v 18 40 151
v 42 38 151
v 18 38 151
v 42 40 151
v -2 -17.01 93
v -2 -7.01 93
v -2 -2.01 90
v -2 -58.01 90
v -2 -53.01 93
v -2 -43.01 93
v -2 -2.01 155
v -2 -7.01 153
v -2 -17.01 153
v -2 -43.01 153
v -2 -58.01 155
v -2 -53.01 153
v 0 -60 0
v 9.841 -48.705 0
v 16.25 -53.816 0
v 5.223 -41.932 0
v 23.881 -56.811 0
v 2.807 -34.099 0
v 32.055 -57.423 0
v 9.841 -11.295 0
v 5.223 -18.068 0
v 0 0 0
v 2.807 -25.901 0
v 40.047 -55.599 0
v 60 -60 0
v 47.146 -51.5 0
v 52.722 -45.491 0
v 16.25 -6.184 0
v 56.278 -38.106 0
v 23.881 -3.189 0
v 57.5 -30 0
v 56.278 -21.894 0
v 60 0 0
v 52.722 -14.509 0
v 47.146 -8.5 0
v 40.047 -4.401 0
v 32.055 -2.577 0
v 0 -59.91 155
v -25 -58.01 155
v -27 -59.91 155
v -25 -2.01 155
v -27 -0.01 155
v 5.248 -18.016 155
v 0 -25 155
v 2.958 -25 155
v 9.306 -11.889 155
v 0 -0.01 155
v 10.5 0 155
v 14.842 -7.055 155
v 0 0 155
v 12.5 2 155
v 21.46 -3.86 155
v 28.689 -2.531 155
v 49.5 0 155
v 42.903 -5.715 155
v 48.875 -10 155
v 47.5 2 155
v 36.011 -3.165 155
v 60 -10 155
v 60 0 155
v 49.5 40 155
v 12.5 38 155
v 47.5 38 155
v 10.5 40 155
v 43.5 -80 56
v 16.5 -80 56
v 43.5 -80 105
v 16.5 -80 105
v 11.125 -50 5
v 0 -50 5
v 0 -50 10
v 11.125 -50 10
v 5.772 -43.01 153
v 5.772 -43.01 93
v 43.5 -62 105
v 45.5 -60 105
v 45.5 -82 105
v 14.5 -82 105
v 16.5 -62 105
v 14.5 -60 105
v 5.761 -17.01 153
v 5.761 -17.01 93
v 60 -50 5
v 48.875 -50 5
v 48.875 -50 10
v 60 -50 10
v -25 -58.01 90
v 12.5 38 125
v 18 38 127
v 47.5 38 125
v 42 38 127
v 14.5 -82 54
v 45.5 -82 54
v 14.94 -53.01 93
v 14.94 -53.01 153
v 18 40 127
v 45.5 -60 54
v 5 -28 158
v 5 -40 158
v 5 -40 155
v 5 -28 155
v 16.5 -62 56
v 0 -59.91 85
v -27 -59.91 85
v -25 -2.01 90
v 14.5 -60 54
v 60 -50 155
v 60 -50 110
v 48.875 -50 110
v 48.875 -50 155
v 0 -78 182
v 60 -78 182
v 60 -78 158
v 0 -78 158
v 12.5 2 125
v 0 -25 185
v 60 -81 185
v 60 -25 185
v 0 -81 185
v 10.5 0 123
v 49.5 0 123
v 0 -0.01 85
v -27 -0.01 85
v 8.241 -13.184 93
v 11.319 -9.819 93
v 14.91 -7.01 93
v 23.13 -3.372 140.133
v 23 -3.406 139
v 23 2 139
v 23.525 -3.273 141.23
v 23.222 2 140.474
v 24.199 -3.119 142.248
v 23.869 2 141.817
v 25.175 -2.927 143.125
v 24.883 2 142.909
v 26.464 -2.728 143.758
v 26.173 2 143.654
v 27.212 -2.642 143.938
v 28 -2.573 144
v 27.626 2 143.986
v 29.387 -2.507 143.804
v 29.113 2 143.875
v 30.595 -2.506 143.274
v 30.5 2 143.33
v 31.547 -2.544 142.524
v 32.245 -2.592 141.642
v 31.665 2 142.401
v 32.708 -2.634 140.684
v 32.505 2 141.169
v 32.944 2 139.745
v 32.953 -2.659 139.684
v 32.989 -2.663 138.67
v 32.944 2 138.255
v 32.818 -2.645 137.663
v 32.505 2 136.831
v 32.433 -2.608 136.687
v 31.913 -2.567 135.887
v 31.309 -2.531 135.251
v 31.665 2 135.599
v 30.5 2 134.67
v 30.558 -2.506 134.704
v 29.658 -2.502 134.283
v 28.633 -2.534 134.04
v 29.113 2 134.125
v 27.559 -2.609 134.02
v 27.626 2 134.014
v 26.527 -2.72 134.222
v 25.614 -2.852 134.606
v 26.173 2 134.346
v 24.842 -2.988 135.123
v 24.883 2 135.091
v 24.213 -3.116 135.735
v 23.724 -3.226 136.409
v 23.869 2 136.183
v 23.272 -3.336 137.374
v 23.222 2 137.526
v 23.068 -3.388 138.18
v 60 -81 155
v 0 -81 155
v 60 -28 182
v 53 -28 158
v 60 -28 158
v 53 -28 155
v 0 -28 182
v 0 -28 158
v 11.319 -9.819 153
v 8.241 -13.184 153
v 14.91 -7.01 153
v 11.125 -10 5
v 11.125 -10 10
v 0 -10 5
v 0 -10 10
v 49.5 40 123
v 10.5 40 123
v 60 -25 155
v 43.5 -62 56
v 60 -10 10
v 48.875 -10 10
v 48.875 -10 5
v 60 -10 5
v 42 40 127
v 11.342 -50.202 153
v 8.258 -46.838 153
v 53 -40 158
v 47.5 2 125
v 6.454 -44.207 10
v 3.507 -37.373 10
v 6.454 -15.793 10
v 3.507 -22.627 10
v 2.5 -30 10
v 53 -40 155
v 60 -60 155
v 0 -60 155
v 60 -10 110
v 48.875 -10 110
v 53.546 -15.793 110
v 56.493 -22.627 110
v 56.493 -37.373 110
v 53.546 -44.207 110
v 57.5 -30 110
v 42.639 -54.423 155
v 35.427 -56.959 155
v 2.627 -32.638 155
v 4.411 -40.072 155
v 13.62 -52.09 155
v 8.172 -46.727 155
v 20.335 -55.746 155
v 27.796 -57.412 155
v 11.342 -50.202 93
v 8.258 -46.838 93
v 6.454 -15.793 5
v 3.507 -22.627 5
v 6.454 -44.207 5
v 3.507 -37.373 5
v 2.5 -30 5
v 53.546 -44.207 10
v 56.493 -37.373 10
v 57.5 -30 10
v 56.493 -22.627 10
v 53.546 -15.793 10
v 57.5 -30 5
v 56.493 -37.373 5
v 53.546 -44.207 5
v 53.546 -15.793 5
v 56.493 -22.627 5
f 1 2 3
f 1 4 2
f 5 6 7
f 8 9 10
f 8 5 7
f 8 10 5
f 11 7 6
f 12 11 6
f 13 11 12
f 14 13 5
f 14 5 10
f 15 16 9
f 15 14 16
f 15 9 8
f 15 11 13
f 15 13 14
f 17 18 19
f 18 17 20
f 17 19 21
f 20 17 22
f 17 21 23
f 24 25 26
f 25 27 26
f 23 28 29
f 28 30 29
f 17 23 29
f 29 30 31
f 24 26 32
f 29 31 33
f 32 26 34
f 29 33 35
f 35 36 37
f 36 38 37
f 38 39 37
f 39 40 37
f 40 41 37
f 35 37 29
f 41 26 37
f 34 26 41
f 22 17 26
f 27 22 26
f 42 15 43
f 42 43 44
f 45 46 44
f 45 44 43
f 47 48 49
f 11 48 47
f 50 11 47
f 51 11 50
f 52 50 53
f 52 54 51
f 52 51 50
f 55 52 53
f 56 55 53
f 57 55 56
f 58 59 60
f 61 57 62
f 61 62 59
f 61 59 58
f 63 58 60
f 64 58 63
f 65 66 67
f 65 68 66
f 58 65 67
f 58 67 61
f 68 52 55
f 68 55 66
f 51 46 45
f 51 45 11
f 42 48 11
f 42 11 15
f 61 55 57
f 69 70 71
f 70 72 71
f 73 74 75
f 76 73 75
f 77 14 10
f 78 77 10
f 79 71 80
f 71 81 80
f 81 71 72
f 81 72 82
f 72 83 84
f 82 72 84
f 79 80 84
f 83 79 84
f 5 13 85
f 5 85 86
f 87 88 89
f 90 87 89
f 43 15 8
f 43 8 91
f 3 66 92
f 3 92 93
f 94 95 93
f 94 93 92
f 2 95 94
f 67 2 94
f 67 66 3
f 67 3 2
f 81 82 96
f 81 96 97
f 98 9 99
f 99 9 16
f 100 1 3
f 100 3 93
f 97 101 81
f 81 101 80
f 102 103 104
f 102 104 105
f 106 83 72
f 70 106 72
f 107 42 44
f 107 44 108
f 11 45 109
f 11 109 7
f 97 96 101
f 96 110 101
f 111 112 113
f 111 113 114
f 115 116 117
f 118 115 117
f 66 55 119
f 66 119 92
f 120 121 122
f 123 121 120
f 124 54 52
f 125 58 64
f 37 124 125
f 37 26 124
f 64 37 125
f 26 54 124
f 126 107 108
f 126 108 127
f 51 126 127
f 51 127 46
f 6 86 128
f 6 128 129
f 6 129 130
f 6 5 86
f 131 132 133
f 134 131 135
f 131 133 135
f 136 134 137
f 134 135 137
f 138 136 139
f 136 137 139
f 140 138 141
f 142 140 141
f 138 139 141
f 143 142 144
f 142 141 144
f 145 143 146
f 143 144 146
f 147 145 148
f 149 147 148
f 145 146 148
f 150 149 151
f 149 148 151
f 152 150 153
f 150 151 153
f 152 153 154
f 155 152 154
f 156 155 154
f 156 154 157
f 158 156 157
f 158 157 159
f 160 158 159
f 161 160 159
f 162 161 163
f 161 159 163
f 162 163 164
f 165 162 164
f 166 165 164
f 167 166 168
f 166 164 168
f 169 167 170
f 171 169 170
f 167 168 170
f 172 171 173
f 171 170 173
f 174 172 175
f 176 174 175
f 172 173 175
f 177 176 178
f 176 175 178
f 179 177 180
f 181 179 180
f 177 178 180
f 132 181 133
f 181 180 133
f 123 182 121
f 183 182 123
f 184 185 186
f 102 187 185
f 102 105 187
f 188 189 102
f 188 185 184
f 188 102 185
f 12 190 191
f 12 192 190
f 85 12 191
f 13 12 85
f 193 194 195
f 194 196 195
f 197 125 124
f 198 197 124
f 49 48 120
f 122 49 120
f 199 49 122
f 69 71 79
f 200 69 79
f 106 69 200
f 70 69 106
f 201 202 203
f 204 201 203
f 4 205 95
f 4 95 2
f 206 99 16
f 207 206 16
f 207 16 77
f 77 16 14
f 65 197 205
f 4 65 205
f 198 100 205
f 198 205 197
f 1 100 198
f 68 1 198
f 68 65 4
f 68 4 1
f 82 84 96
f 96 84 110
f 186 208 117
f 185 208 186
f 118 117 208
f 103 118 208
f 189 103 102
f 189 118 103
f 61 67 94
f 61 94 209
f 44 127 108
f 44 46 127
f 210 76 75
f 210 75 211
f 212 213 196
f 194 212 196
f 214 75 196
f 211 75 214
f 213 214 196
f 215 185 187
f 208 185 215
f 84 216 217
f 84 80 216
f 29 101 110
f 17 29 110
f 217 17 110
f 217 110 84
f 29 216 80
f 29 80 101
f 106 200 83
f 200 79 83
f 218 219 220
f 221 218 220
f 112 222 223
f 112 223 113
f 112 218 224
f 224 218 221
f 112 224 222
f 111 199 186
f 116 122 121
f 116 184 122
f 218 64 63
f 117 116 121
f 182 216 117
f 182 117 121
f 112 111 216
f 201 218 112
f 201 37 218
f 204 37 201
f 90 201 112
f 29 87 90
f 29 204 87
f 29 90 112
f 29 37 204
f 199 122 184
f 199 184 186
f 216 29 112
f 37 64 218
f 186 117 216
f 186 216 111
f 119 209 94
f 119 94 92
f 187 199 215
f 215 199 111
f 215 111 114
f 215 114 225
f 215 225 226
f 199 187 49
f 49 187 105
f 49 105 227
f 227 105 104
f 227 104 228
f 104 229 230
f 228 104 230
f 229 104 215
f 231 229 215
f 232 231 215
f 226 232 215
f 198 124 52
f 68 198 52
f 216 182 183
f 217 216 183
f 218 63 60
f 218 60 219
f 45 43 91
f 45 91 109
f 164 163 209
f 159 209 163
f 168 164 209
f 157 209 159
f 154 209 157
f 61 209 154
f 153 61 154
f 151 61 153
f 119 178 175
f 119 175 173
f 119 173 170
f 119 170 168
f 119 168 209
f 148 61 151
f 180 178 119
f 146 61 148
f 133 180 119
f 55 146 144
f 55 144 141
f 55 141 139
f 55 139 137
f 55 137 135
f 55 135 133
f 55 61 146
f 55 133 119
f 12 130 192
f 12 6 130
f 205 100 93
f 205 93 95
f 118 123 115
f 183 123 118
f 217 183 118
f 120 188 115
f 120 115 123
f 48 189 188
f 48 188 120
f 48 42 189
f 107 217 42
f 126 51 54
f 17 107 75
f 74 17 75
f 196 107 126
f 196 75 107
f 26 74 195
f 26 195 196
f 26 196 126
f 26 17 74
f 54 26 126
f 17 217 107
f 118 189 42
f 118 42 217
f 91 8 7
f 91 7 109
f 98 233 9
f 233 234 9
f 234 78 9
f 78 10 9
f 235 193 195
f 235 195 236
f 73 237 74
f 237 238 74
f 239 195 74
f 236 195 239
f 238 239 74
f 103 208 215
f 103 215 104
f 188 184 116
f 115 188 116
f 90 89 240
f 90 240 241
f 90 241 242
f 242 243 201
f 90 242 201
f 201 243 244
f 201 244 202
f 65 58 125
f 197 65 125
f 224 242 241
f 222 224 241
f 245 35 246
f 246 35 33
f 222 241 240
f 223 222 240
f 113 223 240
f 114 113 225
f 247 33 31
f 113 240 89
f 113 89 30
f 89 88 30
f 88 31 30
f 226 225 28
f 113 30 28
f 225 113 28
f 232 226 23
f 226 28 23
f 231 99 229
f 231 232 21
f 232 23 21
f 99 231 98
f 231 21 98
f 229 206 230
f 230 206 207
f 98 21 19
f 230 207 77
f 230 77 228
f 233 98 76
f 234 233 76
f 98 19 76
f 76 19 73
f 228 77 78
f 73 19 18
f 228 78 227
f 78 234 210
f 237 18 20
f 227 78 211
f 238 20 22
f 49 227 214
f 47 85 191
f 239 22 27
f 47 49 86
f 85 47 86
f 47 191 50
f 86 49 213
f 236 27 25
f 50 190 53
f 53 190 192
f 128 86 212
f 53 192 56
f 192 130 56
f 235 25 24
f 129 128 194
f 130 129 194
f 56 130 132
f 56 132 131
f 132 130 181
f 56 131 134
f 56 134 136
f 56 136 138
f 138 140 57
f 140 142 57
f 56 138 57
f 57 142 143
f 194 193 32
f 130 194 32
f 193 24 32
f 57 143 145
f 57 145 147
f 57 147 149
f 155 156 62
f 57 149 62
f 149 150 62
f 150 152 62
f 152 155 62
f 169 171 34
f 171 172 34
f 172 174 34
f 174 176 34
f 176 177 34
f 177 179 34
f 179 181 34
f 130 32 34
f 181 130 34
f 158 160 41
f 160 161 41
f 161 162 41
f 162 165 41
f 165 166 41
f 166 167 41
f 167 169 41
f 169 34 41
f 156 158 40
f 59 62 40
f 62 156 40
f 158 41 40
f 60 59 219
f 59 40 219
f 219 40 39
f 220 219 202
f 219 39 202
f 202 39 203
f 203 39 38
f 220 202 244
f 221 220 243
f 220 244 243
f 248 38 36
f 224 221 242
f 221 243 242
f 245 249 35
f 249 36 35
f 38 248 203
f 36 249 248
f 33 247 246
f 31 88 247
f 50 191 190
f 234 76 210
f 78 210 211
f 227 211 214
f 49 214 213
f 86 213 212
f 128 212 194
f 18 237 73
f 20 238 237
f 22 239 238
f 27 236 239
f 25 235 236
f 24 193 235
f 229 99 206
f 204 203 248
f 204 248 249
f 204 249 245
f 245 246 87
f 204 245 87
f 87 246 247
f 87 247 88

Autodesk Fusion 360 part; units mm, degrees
sketch "Sketch1" plane through (0, 0, 0) normal (0, 0, 1) x (1, 0, 0)
  line L0 (0, 0) -> (60, 0)
  line L1 (60, 0) -> (60, -60)
  line L2 (60, -60) -> (0, -60)
  line L3 (0, -60) -> (0, 0)
  dimension "d1" = 60
  dimension "d2" = 60
extrude "Extrude1" add sketch "Sketch1" along normal blind 155
sketch "Sketch2" plane through (0, 0, 0) normal (0, 0, 1) x (1, 0, 0)
  line L0 (0, 0) -> (30, 0)
  line L1 (30, 0) -> (30, -30)
  circle A0 centre (30, -30) radius 27.5
  dimension "d5" = 30
  dimension "d6" = 30
  dimension "d7" = 55
extrude "Extrude2" cut sketch "Sketch2" along normal through all
sketch "Sketch3" plane through (0, 0, 0) normal (1, 0, 0) x (0, 1, 0)
  line L0 (0, 0) -> (0, 5)
  line L1 (0, 5) -> (-10, 5)
  line L2 (-10, 5) -> (-50, 5)
  line L3 (-50, 5) -> (-50, 10)
  line L4 (-50, 10) -> (-10, 10)
  line L5 (-10, 10) -> (-10, 5)
  dimension "d9" = 10
  dimension "d10" = 5
  dimension "d11" = 40
  dimension "d12" = 5
extrude "Extrude3" cut sketch "Sketch3" along normal through all
sketch "Sketch4" plane through (0, 0, 0) normal (-1, 0, 0) x (0, -1, 0)
  line L0 (50, 10) -> (50, 5)
  line L1 (50, 5) -> (10, 5)
  line L2 (10, 5) -> (10, 10)
  line L3 (10, 10) -> (50, 10)
  line L4 (0, 0) -> (60, 0)
  line L5 (60, 0) -> (60, 155)
  line L6 (60, 155) -> (0, 155)
  line L7 (0, 155) -> (0, 0)
  line L8 (0, 155) -> (0.01, 155)
  line L9 (0.01, 155) -> (59.91, 155)
  line L10 (59.91, 155) -> (59.91, 85)
  line L11 (59.91, 85) -> (0.01, 85)
  line L12 (0.01, 85) -> (0.01, 155)
  dimension "d14" = 0.01
  dimension "d15" = 59.9
  dimension "d16" = 70
extrude "Extrude4" add sketch "Sketch4" along normal blind 27 contours L6 L9 L10 L11 L12
sketch "Sketch5" plane through (0, 0, 155) normal (0, 0, 1) x (-1, 0, 0)
  circle A0 centre (-30, 30) radius 27.5
  line L0 (0, 60) -> (-60, 60)
  line L1 (-60, 60) -> (-60, 0)
  line L2 (-60, 0) -> (0, 0)
  line L3 (0, 0) -> (0, 0.01)
  line L4 (0, 0.01) -> (27, 0.01)
  line L5 (27, 0.01) -> (27, 59.91)
  line L6 (27, 59.91) -> (0, 59.91)
  line L7 (0, 59.91) -> (0, 60)
  line L8 (27, 0.01) -> (25, 0.01)
  line L9 (25, 0.01) -> (25, 2.01)
  line L10 (25, 2.01) -> (2, 2.01)
  line L11 (2, 2.01) -> (2, 58.01)
  line L12 (2, 58.01) -> (25, 58.01)
  line L13 (25, 58.01) -> (25, 2.01)
  dimension "d19" = 2
  dimension "d20" = 2
  dimension "d21" = 23
  dimension "d22" = 56
extrude "Extrude5" cut sketch "Sketch5" against normal blind 65 contours L10 L11 L12 L13
sketch "Sketch6" plane through (0, -60, 0) normal (0, -1, 0) x (1, 0, 0)
  line L0 (0, 0) -> (60, 0)
  line L1 (60, 0) -> (60, 155)
  line L2 (60, 155) -> (0, 155)
  line L3 (0, 155) -> (0, 0)
sketch "Sketch7" plane through (60, 0, 0) normal (1, 0, 0) x (0, 1, 0)
  line L0 (-50, 5) -> (-50, 10)
  line L1 (-50, 10) -> (-10, 10)
  line L2 (-10, 10) -> (-10, 5)
  line L3 (-10, 5) -> (-50, 5)
  line L4 (-60, 0) -> (0, 0)
  line L5 (0, 0) -> (0, 155)
  line L6 (0, 155) -> (-60, 155)
  line L7 (-60, 155) -> (-60, 0)
sketch "Sketch8" plane through (0, -60, 0) normal (0, -1, 0) x (1, 0, 0)
sketch "Sketch9" plane through (0, -60, 0) normal (0, -1, 0) x (1, 0, 0)
sketch "Sketch10" plane through (0, 0, 0) normal (0, 1, 0) x (-1, 0, 0)
  line L0 (-60, 0) -> (0, 0)
  line L1 (0, 0) -> (0, 155)
  line L2 (0, 155) -> (-60, 155)
  line L3 (-60, 155) -> (-60, 0)
  line L4 (0, 155) -> (-10.5, 155)
  line L5 (-10.5, 155) -> (-49.5, 155)
  line L6 (-49.5, 155) -> (-49.5, 123)
  line L7 (-49.5, 123) -> (-10.5, 123)
  line L8 (-10.5, 123) -> (-10.5, 155)
  dimension "d25" = 10.5
  dimension "d26" = 39
  dimension "d27" = 32
extrude "Extrude6" add sketch "Sketch10" along normal blind 40 contours L2 L5 L6 L7 L8
sketch "Sketch11" plane through (0, 0, 155) normal (0, 0, 1) x (-1, 0, 0)
  line L0 (2, 2.01) -> (2, 58.01)
  line L1 (2, 58.01) -> (25, 58.01)
  line L2 (25, 58.01) -> (25, 2.01)
  line L3 (25, 2.01) -> (2, 2.01)
  circle A0 centre (-30, 30) radius 27.5
  line L4 (0, 60) -> (-60, 60)
  line L5 (-60, 60) -> (-60, 0)
  line L6 (-60, 0) -> (-49.5, 0)
  line L7 (-49.5, 0) -> (-49.5, -40)
  line L8 (-49.5, -40) -> (-10.5, -40)
  line L9 (-10.5, -40) -> (-10.5, 0)
  line L10 (-10.5, 0) -> (0, 0)
  line L11 (0, 0) -> (0, 0.01)
  line L12 (0, 0.01) -> (27, 0.01)
  line L13 (27, 0.01) -> (27, 59.91)
  line L14 (27, 59.91) -> (0, 59.91)
  line L15 (0, 59.91) -> (0, 60)
sketch "Sketch12" plane through (0, 0, 155) normal (0, 0, 1) x (-1, 0, 0)
sketch "Sketch13" plane through (0, 0, 155) normal (0, 0, 1) x (-1, 0, 0)
sketch "Sketch15" plane through (0, 0, 155) normal (0, 0, 1) x (-1, 0, 0)
  line L0 (-49.5, 0) -> (-47.5, 0)
  line L1 (-47.5, 0) -> (-47.5, -2)
  line L2 (-60, 0) -> (-49.5, 0)
  line L3 (-49.5, 0) -> (-49.5, -40)
  line L4 (-47.5, -2) -> (-12.5, -2)
  line L5 (-12.5, -2) -> (-12.5, -38)
  line L6 (-12.5, -38) -> (-47.5, -38)
  line L7 (-47.5, -38) -> (-47.5, -2)
  dimension "d34" = 2
  dimension "d35" = 2
  dimension "d36" = 35
  dimension "d37" = 36
extrude "Extrude7" cut sketch "Sketch15" against normal blind 30
sketch "Sketch16" plane through (0, 40, 0) normal (0, 1, 0) x (-1, 0, 0)
  line L0 (-10.5, 123) -> (-10.5, 155)
  line L1 (-10.5, 155) -> (-49.5, 155)
  line L2 (-49.5, 155) -> (-49.5, 123)
  line L3 (-49.5, 123) -> (-10.5, 123)
  line L4 (-49.5, 155) -> (-42, 155)
  line L5 (-42, 155) -> (-42, 151)
  line L6 (-42, 151) -> (-18, 151)
  line L7 (-18, 151) -> (-18, 127)
  line L8 (-18, 127) -> (-42, 127)
  line L9 (-42, 127) -> (-42, 151)
  dimension "d40" = 7.5
  dimension "d41" = 4
  dimension "d42" = 24
  dimension "d43" = 24
extrude "Extrude8" cut sketch "Sketch16" against normal blind 15 contours L6 L7 L8 L9
sketch "Sketch17" plane through (0, 2, 0) normal (0, 1, 0) x (-1, 0, 0)
  line L0 (-12.5, 155) -> (-47.5, 155)
  line L1 (-47.5, 155) -> (-47.5, 125)
  line L2 (-47.5, 125) -> (-12.5, 125)
  line L3 (-12.5, 125) -> (-12.5, 155)
  line L4 (-47.5, 155) -> (-28, 155)
  line L5 (-28, 155) -> (-28, 139)
  circle A0 centre (-28, 139) radius 5
  dimension "d46" = 19.5
  dimension "d47" = 16
  dimension "d48" = 10
extrude "Extrude9" cut sketch "Sketch17" against normal blind 12 contours A0
sketch "Sketch18" plane through (0, -60, 0) normal (0, -1, 0) x (1, 0, 0)
sketch "Sketch19" plane through (0, -60, 0) normal (0, -1, 0) x (1, 0, 0)
sketch "Sketch20" plane through (0, -60, 0) normal (0, -1, 0) x (1, 0, 0)
  line L0 (45.5, 105) -> (14.5, 105)
  line L1 (14.5, 105) -> (14.5, 54)
  line L2 (14.5, 54) -> (45.5, 54)
  line L3 (45.5, 54) -> (45.5, 105)
  line L4 (60, 0) -> (60, 155)
  line L5 (45.5, 105) -> (60, 105)
  line L6 (60, 105) -> (60, 155)
  dimension "d52" = 31
  dimension "d53" = 51
  dimension "d96" = 50
  dimension "d97" = 14.5
extrude "Extrude10" add sketch "Sketch20" along normal blind 22
sketch "Sketch21" plane through (0, 0, 155) normal (0, 0, 1) x (-1, 0, 0)
  line L0 (-12.5, -2) -> (-12.5, -38)
  line L1 (-12.5, -38) -> (-47.5, -38)
  line L2 (-47.5, -38) -> (-47.5, -2)
  line L3 (-47.5, -2) -> (-12.5, -2)
  line L4 (2, 2.01) -> (2, 58.01)
  line L5 (2, 58.01) -> (25, 58.01)
  line L6 (25, 58.01) -> (25, 2.01)
  line L7 (25, 2.01) -> (2, 2.01)
  circle A0 centre (-30, 30) radius 27.5
  line L8 (0, 60) -> (-60, 60)
  line L9 (-60, 60) -> (-60, 0)
  line L10 (-60, 0) -> (-49.5, 0)
  line L11 (-49.5, 0) -> (-49.5, -40)
  line L12 (-49.5, -40) -> (-10.5, -40)
  line L13 (-10.5, -40) -> (-10.5, 0)
  line L14 (-10.5, 0) -> (0, 0)
  line L15 (0, 0) -> (0, 0.01)
  line L16 (0, 0.01) -> (27, 0.01)
  line L17 (27, 0.01) -> (27, 59.91)
  line L18 (27, 59.91) -> (0, 59.91)
  line L19 (0, 59.91) -> (0, 60)
  line L20 (-14.5, 82) -> (-14.5, 80)
  line L21 (-14.5, 80) -> (-16.5, 80)
  dimension "d56" = 2
  dimension "d57" = 2
sketch "Sketch22" plane through (0, 0, 155) normal (0, 0, 1) x (-1, 0, 0)
  line L0 (-16.5, 80) -> (-43.5, 80)
  line L1 (-43.5, 80) -> (-43.5, 62)
  line L2 (-43.5, 62) -> (-16.5, 62)
  line L3 (-16.5, 62) -> (-16.5, 80)
  dimension "d58" = 27
  dimension "d59" = 18
extrude "Extrude11" cut sketch "Sketch22" against normal blind 99
sketch "Sketch23" plane through (0, 0, 155) normal (0, 0, 1) x (-1, 0, 0)
sketch "Sketch24" plane through (0, 0, 155) normal (0, 0, 1) x (1, 0, 0)
sketch "Sketch26" plane through (-2, 0, 0) normal (-1, 0, 0) x (0, -1, 0)
  line L0 (58.01, 155) -> (2.01, 155)
  line L1 (2.01, 155) -> (2.01, 90)
  line L2 (2.01, 90) -> (58.01, 90)
  line L3 (58.01, 90) -> (58.01, 155)
  line L4 (2.01, 155) -> (2.01, 153)
  line L5 (2.01, 153) -> (7.01, 153)
  line L6 (7.01, 153) -> (17.01, 153)
  line L7 (17.01, 153) -> (17.01, 93)
  line L8 (17.01, 93) -> (7.01, 93)
  line L9 (7.01, 93) -> (7.01, 153)
  line L10 (30.01, 155) -> (30.01, 90)
  line L11 (2.01, 155) -> (58.01, 155)
  line L12 (43.01, 153) -> (43.01, 93)
  line L13 (53.01, 153) -> (43.01, 153)
  line L14 (53.01, 93) -> (53.01, 153)
  line L15 (43.01, 93) -> (53.01, 93)
  dimension "d66" = 2
  dimension "d67" = 5
  dimension "d68" = 10
  dimension "d69" = 60
extrude "Extrude14" cut sketch "Sketch26" against normal blind 25 contours L12 L13 L14 L15
extrude "Extrude13" cut sketch "Sketch26" against normal blind 25 contours L6 L7 L8 L9
sketch "Sketch27" plane through (60, 0, 0) normal (1, 0, 0) x (0, 1, 0)
  line L0 (-60, 155) -> (-50, 155)
  line L1 (-50, 155) -> (-10, 155)
  line L2 (-10, 155) -> (-10, 110)
  line L3 (-10, 110) -> (-50, 110)
  line L4 (-50, 110) -> (-50, 155)
  dimension "d74" = 10
  dimension "d75" = 40
  dimension "d76" = 45
extrude "Extrude15" cut sketch "Sketch27" against normal blind 20
sketch "Sketch28" plane through (0, 0, 155) normal (0, 0, 1) x (-1, 0, 0)
  line L0 (-60, 30) -> (0, 30) construction
  line L1 (-60, 60) -> (-60, 0)
  line L2 (0, 30) -> (0, 25)
  line L3 (0, 25) -> (-60, 25)
  line L4 (-60, 25) -> (-60, 81)
  line L5 (-60, 81) -> (0, 81)
  line L6 (0, 81) -> (0, 25)
  dimension "d79" = 5
  dimension "d80" = 60
  dimension "d81" = 56
extrude "Extrude16" add sketch "Sketch28" along normal blind 30
sketch "Sketch29" plane through (0, 0, 155) normal (0, 0, 1) x (-1, 0, 0)
sketch "Sketch30" plane through (0, 0, 0) normal (-1, 0, 0) x (0, -1, 0)
  line L0 (59.91, 155) -> (59.91, 85)
  line L1 (59.91, 85) -> (0.01, 85)
  line L2 (0.01, 85) -> (0.01, 155)
  line L3 (0.01, 155) -> (0, 155)
  line L4 (0, 155) -> (0, 0)
  line L5 (0, 0) -> (60, 0)
  line L6 (60, 0) -> (60, 155)
  line L7 (60, 155) -> (81, 155)
  line L8 (81, 155) -> (81, 185)
  line L9 (81, 185) -> (25, 185)
  line L10 (25, 185) -> (25, 155)
  line L11 (25, 155) -> (59.91, 155)
  line L12 (50, 10) -> (50, 5)
  line L13 (50, 5) -> (10, 5)
  line L14 (10, 5) -> (10, 10)
  line L15 (10, 10) -> (50, 10)
  line L16 (25, 185) -> (28, 185)
  line L17 (28, 185) -> (28, 182)
  line L18 (28, 182) -> (78, 182)
  line L19 (78, 182) -> (78, 158)
  line L20 (78, 158) -> (28, 158)
  line L21 (28, 158) -> (28, 182)
  dimension "d84" = 3
  dimension "d85" = 3
  dimension "d86" = 50
  dimension "d87" = 24
extrude "Extrude17" cut sketch "Sketch30" against normal through all contours L18 L19 L20 L21
sketch "Sketch31" plane through (60, 0, 0) normal (1, 0, 0) x (0, 1, 0)
sketch "Sketch32" plane through (0, 0, 185) normal (0, 0, 1) x (-1, 0, 0)
  line L0 (0, 81) -> (-60, 81)
  line L1 (-60, 81) -> (-60, 25)
  line L2 (-60, 25) -> (0, 25)
  line L3 (0, 25) -> (0, 81)
  line L4 (0, 25) -> (-60, 25)
  line L5 (-60, 25) -> (-60, 48)
  line L6 (-60, 48) -> (0, 48)
  line L7 (0, 48) -> (0, 25)
  dimension "d89" = 60
  dimension "d90" = 23
sketch "Sketch33" plane through (0, 0, 158) normal (0, 0, 1) x (-1, 0, 0)
  line L0 (-60, 78) -> (-60, 28)
  line L1 (-60, 28) -> (0, 28)
  line L2 (0, 28) -> (0, 78)
  line L3 (0, 78) -> (-60, 78)
  line L4 (0, 28) -> (-5, 28)
  line L5 (-5, 28) -> (-53, 28)
  line L6 (-53, 28) -> (-53, 40)
  line L7 (-53, 40) -> (-5, 40)
  line L8 (-5, 40) -> (-5, 28)
  dimension "d93" = 48
  dimension "d94" = 12
extrude "Extrude19" cut sketch "Sketch33" against normal through all contours L1 L5 L6 L7 L8
equation "d60 = -49.00 mm - 50 mm"
